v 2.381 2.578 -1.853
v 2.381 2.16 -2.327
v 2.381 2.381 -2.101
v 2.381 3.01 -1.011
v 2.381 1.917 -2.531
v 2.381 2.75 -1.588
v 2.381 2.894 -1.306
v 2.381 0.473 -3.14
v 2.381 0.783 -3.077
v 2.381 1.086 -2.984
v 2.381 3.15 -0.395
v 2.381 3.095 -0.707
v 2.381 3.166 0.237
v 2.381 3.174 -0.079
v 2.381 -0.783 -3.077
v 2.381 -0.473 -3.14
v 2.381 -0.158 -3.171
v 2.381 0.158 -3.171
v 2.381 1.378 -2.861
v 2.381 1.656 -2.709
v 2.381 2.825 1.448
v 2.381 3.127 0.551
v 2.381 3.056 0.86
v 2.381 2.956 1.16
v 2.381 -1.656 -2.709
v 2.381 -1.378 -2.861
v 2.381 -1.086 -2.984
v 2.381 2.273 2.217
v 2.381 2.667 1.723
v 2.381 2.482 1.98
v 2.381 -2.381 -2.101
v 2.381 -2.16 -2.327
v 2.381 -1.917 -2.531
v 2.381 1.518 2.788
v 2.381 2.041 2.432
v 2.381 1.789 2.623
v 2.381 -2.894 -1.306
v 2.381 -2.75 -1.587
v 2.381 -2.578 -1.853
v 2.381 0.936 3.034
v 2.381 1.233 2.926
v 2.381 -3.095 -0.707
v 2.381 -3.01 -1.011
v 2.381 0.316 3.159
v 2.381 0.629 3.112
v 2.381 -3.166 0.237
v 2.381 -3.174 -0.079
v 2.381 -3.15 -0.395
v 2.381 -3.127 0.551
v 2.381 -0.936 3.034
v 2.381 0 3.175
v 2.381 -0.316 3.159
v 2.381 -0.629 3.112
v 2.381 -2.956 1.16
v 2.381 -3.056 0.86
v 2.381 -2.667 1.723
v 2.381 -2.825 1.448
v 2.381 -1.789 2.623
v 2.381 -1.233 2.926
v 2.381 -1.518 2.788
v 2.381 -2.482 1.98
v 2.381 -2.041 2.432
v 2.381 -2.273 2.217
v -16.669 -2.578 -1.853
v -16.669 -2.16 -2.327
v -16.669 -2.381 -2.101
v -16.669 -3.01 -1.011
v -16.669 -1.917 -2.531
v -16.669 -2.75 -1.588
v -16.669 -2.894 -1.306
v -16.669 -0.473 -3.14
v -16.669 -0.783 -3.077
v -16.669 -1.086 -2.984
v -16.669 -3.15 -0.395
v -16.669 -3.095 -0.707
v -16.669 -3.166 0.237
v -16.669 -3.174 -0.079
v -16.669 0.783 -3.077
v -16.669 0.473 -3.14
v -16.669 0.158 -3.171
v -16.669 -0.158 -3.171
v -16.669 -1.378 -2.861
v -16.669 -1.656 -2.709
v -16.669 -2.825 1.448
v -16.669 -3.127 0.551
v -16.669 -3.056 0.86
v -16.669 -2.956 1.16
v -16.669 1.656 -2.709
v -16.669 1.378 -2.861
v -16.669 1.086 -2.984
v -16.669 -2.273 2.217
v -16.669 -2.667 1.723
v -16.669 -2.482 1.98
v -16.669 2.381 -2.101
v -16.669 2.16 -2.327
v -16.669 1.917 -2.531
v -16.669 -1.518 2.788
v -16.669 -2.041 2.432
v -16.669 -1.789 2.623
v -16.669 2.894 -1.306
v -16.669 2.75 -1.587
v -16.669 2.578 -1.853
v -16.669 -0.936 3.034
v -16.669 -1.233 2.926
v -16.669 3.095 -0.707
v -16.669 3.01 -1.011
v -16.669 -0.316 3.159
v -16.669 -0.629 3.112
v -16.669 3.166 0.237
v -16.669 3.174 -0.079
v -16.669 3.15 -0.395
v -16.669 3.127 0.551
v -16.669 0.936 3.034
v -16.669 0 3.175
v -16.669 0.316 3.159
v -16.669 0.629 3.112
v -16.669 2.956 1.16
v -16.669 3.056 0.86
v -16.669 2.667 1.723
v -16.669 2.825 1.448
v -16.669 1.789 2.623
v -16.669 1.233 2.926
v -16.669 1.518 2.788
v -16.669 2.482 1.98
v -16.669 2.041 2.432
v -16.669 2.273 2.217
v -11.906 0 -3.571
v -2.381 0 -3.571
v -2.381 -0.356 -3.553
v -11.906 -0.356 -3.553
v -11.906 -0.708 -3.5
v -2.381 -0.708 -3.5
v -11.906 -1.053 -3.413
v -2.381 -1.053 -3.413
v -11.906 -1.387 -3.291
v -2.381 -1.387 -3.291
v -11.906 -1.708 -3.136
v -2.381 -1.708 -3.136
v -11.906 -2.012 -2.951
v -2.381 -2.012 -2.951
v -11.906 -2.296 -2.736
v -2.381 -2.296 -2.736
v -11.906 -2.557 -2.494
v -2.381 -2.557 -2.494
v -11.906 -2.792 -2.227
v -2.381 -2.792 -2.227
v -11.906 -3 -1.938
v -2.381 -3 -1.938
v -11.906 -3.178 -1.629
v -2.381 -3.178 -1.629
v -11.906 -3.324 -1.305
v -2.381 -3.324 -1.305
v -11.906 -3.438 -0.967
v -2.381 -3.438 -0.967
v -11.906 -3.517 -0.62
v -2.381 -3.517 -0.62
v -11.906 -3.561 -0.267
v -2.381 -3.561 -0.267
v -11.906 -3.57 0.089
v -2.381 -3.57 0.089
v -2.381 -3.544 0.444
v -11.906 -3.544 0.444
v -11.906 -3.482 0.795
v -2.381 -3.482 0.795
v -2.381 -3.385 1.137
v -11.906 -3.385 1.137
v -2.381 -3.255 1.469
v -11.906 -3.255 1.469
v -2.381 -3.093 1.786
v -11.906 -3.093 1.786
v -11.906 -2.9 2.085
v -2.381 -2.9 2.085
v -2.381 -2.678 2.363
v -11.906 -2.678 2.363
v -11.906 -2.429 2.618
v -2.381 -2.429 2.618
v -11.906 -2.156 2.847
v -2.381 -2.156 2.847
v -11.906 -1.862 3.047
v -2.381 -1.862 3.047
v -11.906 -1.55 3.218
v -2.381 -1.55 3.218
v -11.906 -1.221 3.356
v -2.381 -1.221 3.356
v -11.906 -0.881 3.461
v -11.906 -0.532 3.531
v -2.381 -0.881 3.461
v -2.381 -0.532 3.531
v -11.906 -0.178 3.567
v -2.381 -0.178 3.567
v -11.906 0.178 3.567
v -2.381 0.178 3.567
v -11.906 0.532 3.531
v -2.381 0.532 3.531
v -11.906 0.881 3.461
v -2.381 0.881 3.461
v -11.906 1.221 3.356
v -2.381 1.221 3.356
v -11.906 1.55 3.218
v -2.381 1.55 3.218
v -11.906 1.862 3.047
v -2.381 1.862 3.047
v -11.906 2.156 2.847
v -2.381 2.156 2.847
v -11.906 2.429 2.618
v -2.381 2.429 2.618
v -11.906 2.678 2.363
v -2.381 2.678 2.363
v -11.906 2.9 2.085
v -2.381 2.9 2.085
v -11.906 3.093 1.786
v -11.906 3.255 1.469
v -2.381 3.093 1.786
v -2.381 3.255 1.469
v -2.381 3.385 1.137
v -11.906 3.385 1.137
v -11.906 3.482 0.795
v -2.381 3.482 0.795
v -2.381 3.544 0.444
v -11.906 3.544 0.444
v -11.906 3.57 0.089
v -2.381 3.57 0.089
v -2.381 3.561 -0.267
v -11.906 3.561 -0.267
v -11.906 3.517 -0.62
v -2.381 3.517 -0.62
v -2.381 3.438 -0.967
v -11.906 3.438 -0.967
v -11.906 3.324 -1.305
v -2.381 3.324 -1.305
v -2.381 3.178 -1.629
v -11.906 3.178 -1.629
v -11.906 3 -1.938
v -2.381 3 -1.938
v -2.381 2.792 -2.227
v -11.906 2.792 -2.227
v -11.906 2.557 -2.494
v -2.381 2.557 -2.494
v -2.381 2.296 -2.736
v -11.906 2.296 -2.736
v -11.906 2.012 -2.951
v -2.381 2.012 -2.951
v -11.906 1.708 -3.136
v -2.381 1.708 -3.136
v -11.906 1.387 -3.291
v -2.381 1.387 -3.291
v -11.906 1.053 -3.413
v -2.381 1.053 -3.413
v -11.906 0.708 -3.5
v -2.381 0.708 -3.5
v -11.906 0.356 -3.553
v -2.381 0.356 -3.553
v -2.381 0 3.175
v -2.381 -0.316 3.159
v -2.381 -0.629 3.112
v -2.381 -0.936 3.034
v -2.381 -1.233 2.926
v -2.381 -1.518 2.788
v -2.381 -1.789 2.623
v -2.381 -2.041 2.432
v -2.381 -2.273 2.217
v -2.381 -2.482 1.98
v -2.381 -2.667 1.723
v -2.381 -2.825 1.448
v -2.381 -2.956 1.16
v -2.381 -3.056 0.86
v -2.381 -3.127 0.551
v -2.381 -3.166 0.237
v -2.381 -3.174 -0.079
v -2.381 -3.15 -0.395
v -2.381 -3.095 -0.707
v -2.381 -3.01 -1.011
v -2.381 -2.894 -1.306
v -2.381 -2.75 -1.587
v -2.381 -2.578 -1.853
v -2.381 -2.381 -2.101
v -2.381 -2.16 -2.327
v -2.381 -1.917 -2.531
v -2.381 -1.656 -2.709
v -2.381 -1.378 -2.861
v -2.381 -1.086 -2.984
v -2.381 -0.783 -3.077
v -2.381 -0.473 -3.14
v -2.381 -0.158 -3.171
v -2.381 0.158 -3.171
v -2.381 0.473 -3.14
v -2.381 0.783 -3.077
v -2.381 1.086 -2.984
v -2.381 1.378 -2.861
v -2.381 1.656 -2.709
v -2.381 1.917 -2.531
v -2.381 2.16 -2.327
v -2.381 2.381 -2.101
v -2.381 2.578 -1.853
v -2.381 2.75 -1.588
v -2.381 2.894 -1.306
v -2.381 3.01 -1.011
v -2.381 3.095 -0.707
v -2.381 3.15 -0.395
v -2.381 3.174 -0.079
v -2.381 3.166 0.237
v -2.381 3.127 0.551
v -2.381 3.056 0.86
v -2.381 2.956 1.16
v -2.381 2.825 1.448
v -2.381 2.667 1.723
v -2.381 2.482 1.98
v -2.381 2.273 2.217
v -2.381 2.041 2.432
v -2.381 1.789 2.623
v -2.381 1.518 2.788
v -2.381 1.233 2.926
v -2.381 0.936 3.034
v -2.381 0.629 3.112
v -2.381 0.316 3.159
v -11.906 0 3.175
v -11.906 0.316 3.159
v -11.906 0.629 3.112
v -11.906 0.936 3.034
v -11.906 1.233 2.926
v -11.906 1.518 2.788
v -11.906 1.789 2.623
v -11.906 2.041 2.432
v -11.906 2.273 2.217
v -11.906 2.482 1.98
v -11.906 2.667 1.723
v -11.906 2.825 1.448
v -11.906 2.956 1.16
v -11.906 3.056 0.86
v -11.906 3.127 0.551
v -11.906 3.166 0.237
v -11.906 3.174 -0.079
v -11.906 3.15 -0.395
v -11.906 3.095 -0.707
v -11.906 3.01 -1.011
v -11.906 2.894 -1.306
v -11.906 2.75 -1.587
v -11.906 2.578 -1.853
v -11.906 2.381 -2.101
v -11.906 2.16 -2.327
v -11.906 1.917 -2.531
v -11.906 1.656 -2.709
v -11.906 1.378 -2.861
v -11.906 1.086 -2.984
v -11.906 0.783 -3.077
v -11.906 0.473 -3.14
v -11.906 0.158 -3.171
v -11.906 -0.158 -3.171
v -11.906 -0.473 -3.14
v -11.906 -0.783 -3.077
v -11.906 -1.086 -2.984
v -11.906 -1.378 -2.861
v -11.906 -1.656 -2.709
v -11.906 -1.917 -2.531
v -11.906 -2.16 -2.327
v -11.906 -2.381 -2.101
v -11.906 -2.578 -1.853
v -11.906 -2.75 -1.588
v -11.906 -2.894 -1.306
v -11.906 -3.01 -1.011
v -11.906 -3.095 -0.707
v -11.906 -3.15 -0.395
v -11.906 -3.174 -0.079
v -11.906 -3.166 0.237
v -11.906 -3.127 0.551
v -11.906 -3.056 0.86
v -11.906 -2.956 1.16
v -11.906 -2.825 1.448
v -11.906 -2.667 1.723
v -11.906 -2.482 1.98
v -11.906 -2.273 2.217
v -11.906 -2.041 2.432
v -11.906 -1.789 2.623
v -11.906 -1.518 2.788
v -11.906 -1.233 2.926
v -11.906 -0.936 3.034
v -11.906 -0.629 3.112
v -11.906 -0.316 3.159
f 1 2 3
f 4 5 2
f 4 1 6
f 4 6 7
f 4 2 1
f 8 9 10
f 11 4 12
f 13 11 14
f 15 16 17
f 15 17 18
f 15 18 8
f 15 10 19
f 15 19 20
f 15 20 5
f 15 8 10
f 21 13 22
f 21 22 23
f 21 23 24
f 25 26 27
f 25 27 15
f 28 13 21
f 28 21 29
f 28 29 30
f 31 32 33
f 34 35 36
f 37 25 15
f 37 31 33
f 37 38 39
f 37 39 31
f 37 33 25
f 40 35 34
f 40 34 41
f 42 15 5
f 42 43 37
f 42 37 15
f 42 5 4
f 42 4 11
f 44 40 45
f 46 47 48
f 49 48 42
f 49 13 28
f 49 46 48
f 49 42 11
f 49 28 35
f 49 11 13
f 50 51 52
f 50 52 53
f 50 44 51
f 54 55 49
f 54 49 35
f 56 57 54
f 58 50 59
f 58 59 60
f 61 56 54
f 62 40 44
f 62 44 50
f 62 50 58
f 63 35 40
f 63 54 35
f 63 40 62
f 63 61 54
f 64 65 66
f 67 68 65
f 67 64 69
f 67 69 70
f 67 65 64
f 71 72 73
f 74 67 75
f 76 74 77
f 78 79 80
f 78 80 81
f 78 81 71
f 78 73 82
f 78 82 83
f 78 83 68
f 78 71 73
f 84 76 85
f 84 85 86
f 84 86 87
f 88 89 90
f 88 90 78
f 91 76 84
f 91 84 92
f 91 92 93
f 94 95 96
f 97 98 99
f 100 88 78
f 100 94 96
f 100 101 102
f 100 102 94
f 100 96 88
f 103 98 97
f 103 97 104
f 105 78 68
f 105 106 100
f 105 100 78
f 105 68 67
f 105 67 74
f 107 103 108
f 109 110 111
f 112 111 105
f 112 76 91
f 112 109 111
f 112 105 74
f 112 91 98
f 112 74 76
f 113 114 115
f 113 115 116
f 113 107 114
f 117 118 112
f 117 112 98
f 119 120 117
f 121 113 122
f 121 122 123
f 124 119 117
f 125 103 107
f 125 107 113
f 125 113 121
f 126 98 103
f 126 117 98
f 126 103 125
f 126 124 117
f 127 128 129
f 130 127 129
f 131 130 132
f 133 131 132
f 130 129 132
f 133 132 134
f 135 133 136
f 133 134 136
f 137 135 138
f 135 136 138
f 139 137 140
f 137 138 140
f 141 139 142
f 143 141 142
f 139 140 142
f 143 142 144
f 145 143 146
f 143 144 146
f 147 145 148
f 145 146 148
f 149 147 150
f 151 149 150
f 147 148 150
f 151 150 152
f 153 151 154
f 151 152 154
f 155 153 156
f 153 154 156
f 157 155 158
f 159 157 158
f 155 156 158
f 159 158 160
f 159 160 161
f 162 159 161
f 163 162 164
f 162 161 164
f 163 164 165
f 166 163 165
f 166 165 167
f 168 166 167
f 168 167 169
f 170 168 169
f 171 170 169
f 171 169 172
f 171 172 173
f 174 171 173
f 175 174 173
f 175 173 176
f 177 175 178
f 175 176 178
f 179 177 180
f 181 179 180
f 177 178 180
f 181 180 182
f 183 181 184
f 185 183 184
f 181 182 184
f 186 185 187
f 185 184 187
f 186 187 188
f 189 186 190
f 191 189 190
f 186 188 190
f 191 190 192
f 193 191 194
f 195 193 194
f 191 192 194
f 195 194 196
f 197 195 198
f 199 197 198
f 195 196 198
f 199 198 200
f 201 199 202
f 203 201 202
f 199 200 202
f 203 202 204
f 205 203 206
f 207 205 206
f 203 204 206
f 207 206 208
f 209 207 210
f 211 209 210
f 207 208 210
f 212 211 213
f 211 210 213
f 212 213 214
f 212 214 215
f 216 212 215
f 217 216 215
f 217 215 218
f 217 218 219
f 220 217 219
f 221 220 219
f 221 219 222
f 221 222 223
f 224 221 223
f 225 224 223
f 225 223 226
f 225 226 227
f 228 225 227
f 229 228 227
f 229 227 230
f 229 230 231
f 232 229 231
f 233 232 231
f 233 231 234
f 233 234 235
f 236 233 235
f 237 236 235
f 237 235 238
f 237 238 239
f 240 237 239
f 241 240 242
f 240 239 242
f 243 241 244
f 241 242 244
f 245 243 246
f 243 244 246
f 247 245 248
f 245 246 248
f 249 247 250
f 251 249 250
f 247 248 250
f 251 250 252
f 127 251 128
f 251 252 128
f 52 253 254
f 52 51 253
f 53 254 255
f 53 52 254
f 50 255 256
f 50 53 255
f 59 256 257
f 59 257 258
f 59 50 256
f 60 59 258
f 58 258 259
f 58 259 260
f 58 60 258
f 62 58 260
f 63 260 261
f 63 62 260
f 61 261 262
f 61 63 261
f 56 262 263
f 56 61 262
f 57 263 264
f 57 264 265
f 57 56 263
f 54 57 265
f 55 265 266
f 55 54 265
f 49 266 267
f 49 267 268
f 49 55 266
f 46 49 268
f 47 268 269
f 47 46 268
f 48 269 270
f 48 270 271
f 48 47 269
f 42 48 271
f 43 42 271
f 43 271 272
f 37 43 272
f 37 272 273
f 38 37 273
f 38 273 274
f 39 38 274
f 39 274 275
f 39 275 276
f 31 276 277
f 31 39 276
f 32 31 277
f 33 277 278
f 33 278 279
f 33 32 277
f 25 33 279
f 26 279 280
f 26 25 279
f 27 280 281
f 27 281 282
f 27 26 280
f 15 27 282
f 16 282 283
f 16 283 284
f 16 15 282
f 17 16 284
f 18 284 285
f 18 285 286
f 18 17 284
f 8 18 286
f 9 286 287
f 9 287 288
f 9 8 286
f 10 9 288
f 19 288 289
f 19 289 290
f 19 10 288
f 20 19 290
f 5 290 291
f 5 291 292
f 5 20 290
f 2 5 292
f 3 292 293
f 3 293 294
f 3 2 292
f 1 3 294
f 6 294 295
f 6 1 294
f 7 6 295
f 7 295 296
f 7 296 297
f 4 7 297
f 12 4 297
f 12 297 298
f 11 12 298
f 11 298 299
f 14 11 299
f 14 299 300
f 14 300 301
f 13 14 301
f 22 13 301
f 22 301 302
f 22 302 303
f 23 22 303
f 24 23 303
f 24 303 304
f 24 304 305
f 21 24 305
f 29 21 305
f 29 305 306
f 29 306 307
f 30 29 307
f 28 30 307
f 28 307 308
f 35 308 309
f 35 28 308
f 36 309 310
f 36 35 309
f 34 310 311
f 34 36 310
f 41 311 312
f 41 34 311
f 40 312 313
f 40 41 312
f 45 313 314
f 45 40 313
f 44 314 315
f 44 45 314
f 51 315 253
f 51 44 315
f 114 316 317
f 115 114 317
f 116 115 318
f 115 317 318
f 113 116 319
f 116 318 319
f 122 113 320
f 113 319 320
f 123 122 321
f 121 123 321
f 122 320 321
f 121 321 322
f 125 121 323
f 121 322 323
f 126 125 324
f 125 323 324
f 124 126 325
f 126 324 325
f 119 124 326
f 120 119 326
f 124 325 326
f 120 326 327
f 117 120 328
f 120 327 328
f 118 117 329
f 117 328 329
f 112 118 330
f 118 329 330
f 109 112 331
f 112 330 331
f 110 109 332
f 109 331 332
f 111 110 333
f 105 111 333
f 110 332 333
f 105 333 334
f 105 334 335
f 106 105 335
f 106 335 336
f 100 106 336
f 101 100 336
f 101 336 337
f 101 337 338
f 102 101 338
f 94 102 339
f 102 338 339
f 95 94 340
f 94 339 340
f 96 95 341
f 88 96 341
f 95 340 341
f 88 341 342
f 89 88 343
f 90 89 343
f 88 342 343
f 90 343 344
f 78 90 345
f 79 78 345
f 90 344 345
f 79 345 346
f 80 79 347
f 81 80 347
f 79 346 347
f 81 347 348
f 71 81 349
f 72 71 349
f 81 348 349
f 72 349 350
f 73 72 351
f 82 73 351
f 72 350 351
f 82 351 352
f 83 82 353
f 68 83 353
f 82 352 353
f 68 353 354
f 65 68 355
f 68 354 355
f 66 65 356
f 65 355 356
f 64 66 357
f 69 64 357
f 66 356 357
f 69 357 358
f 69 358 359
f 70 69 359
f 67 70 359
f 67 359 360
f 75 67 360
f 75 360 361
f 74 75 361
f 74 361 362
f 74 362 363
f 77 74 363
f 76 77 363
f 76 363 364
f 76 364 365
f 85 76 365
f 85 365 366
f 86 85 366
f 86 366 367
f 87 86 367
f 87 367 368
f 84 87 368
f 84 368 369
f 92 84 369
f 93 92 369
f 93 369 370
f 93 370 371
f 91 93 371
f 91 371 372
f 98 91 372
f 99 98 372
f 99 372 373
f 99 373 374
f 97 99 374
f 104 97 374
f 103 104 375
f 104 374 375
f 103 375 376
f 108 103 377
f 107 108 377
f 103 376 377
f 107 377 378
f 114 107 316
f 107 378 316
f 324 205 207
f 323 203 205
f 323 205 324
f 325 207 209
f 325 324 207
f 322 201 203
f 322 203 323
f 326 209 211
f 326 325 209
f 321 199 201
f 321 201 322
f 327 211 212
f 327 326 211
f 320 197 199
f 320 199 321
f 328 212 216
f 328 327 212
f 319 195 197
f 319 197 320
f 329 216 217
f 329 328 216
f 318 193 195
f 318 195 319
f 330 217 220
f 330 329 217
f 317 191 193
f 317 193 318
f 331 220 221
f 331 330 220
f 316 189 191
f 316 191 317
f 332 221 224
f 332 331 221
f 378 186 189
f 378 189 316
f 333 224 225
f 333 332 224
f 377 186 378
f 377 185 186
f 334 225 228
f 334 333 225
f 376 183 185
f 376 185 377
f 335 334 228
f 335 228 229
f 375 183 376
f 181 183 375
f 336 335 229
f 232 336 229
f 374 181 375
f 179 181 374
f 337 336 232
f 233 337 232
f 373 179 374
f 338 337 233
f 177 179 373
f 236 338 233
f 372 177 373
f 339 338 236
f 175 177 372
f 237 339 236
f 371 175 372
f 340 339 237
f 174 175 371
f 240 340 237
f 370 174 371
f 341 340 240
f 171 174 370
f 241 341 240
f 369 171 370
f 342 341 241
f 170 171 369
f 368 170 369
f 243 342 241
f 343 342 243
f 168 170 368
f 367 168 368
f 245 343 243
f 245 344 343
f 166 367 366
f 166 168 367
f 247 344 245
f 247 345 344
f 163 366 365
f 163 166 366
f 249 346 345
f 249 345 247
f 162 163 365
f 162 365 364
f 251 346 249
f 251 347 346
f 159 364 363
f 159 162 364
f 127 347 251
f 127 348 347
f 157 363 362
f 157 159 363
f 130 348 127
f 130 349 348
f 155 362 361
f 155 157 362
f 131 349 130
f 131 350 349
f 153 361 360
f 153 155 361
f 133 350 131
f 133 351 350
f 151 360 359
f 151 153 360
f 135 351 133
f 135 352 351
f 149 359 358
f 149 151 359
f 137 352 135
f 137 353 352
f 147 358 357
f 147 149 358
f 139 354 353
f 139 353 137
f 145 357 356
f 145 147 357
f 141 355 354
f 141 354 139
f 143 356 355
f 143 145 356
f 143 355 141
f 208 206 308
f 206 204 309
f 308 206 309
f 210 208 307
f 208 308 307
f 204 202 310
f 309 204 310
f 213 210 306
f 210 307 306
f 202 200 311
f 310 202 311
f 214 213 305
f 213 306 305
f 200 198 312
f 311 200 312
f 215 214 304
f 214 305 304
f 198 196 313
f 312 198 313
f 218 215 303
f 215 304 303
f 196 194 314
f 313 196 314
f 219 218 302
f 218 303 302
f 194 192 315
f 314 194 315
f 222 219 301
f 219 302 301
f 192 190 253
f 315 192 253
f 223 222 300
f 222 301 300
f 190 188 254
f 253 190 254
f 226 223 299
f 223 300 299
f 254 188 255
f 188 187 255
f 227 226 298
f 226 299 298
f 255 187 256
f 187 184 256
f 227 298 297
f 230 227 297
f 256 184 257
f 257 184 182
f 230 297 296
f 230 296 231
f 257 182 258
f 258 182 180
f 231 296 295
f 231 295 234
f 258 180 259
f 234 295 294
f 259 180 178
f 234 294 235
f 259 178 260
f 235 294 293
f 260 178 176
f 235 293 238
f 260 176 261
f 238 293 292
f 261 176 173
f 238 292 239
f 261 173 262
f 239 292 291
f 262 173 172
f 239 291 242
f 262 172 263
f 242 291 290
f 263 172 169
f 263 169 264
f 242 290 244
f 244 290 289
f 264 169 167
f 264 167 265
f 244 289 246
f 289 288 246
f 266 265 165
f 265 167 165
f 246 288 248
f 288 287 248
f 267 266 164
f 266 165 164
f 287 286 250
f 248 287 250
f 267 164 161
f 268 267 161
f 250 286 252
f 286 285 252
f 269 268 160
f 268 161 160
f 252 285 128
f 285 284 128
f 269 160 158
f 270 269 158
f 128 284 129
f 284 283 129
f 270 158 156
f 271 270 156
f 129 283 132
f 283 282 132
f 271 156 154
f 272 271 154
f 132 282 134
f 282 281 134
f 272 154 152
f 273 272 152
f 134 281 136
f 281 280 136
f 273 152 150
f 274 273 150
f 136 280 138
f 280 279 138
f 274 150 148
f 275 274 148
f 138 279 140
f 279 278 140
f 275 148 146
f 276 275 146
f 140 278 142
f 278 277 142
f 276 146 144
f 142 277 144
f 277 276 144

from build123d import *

# Parameters (mm, degrees)
SKETCH2_R           = 3.175
BOSS_EXTRUDE1_DEPTH = 2.38125
SKETCH3_R           = 3.57124
BOSS_EXTRUDE2_DEPTH = 9.525
SKETCH5_R           = 3.175
BOSS_EXTRUDE3_DEPTH = 4.7625


with BuildPart() as part:
    # Sketch2 → Boss-Extrude1 (new, symmetric)
    with BuildSketch(Plane(origin=(0, 0, 0), x_dir=(0, 0, -1), z_dir=(1, 0, 0))):
        with Locations(Location((0, 0, 0), (0, 0, 180))):
            Circle(SKETCH2_R)
    extrude(amount=BOSS_EXTRUDE1_DEPTH, both=True)

    # Sketch3 → Boss-Extrude2 (add)
    with BuildSketch(Plane.ZY.offset(2.38125)):
        with Locations(Location((0, 0, 0), (0, 0, 180))):
            Circle(SKETCH3_R)
    extrude(amount=BOSS_EXTRUDE2_DEPTH)

    # Sketch5 → Boss-Extrude3 (add)
    with BuildSketch(Plane.ZY.offset(11.90625)):
        Circle(SKETCH5_R)
    extrude(amount=BOSS_EXTRUDE3_DEPTH)


solid = part.part
